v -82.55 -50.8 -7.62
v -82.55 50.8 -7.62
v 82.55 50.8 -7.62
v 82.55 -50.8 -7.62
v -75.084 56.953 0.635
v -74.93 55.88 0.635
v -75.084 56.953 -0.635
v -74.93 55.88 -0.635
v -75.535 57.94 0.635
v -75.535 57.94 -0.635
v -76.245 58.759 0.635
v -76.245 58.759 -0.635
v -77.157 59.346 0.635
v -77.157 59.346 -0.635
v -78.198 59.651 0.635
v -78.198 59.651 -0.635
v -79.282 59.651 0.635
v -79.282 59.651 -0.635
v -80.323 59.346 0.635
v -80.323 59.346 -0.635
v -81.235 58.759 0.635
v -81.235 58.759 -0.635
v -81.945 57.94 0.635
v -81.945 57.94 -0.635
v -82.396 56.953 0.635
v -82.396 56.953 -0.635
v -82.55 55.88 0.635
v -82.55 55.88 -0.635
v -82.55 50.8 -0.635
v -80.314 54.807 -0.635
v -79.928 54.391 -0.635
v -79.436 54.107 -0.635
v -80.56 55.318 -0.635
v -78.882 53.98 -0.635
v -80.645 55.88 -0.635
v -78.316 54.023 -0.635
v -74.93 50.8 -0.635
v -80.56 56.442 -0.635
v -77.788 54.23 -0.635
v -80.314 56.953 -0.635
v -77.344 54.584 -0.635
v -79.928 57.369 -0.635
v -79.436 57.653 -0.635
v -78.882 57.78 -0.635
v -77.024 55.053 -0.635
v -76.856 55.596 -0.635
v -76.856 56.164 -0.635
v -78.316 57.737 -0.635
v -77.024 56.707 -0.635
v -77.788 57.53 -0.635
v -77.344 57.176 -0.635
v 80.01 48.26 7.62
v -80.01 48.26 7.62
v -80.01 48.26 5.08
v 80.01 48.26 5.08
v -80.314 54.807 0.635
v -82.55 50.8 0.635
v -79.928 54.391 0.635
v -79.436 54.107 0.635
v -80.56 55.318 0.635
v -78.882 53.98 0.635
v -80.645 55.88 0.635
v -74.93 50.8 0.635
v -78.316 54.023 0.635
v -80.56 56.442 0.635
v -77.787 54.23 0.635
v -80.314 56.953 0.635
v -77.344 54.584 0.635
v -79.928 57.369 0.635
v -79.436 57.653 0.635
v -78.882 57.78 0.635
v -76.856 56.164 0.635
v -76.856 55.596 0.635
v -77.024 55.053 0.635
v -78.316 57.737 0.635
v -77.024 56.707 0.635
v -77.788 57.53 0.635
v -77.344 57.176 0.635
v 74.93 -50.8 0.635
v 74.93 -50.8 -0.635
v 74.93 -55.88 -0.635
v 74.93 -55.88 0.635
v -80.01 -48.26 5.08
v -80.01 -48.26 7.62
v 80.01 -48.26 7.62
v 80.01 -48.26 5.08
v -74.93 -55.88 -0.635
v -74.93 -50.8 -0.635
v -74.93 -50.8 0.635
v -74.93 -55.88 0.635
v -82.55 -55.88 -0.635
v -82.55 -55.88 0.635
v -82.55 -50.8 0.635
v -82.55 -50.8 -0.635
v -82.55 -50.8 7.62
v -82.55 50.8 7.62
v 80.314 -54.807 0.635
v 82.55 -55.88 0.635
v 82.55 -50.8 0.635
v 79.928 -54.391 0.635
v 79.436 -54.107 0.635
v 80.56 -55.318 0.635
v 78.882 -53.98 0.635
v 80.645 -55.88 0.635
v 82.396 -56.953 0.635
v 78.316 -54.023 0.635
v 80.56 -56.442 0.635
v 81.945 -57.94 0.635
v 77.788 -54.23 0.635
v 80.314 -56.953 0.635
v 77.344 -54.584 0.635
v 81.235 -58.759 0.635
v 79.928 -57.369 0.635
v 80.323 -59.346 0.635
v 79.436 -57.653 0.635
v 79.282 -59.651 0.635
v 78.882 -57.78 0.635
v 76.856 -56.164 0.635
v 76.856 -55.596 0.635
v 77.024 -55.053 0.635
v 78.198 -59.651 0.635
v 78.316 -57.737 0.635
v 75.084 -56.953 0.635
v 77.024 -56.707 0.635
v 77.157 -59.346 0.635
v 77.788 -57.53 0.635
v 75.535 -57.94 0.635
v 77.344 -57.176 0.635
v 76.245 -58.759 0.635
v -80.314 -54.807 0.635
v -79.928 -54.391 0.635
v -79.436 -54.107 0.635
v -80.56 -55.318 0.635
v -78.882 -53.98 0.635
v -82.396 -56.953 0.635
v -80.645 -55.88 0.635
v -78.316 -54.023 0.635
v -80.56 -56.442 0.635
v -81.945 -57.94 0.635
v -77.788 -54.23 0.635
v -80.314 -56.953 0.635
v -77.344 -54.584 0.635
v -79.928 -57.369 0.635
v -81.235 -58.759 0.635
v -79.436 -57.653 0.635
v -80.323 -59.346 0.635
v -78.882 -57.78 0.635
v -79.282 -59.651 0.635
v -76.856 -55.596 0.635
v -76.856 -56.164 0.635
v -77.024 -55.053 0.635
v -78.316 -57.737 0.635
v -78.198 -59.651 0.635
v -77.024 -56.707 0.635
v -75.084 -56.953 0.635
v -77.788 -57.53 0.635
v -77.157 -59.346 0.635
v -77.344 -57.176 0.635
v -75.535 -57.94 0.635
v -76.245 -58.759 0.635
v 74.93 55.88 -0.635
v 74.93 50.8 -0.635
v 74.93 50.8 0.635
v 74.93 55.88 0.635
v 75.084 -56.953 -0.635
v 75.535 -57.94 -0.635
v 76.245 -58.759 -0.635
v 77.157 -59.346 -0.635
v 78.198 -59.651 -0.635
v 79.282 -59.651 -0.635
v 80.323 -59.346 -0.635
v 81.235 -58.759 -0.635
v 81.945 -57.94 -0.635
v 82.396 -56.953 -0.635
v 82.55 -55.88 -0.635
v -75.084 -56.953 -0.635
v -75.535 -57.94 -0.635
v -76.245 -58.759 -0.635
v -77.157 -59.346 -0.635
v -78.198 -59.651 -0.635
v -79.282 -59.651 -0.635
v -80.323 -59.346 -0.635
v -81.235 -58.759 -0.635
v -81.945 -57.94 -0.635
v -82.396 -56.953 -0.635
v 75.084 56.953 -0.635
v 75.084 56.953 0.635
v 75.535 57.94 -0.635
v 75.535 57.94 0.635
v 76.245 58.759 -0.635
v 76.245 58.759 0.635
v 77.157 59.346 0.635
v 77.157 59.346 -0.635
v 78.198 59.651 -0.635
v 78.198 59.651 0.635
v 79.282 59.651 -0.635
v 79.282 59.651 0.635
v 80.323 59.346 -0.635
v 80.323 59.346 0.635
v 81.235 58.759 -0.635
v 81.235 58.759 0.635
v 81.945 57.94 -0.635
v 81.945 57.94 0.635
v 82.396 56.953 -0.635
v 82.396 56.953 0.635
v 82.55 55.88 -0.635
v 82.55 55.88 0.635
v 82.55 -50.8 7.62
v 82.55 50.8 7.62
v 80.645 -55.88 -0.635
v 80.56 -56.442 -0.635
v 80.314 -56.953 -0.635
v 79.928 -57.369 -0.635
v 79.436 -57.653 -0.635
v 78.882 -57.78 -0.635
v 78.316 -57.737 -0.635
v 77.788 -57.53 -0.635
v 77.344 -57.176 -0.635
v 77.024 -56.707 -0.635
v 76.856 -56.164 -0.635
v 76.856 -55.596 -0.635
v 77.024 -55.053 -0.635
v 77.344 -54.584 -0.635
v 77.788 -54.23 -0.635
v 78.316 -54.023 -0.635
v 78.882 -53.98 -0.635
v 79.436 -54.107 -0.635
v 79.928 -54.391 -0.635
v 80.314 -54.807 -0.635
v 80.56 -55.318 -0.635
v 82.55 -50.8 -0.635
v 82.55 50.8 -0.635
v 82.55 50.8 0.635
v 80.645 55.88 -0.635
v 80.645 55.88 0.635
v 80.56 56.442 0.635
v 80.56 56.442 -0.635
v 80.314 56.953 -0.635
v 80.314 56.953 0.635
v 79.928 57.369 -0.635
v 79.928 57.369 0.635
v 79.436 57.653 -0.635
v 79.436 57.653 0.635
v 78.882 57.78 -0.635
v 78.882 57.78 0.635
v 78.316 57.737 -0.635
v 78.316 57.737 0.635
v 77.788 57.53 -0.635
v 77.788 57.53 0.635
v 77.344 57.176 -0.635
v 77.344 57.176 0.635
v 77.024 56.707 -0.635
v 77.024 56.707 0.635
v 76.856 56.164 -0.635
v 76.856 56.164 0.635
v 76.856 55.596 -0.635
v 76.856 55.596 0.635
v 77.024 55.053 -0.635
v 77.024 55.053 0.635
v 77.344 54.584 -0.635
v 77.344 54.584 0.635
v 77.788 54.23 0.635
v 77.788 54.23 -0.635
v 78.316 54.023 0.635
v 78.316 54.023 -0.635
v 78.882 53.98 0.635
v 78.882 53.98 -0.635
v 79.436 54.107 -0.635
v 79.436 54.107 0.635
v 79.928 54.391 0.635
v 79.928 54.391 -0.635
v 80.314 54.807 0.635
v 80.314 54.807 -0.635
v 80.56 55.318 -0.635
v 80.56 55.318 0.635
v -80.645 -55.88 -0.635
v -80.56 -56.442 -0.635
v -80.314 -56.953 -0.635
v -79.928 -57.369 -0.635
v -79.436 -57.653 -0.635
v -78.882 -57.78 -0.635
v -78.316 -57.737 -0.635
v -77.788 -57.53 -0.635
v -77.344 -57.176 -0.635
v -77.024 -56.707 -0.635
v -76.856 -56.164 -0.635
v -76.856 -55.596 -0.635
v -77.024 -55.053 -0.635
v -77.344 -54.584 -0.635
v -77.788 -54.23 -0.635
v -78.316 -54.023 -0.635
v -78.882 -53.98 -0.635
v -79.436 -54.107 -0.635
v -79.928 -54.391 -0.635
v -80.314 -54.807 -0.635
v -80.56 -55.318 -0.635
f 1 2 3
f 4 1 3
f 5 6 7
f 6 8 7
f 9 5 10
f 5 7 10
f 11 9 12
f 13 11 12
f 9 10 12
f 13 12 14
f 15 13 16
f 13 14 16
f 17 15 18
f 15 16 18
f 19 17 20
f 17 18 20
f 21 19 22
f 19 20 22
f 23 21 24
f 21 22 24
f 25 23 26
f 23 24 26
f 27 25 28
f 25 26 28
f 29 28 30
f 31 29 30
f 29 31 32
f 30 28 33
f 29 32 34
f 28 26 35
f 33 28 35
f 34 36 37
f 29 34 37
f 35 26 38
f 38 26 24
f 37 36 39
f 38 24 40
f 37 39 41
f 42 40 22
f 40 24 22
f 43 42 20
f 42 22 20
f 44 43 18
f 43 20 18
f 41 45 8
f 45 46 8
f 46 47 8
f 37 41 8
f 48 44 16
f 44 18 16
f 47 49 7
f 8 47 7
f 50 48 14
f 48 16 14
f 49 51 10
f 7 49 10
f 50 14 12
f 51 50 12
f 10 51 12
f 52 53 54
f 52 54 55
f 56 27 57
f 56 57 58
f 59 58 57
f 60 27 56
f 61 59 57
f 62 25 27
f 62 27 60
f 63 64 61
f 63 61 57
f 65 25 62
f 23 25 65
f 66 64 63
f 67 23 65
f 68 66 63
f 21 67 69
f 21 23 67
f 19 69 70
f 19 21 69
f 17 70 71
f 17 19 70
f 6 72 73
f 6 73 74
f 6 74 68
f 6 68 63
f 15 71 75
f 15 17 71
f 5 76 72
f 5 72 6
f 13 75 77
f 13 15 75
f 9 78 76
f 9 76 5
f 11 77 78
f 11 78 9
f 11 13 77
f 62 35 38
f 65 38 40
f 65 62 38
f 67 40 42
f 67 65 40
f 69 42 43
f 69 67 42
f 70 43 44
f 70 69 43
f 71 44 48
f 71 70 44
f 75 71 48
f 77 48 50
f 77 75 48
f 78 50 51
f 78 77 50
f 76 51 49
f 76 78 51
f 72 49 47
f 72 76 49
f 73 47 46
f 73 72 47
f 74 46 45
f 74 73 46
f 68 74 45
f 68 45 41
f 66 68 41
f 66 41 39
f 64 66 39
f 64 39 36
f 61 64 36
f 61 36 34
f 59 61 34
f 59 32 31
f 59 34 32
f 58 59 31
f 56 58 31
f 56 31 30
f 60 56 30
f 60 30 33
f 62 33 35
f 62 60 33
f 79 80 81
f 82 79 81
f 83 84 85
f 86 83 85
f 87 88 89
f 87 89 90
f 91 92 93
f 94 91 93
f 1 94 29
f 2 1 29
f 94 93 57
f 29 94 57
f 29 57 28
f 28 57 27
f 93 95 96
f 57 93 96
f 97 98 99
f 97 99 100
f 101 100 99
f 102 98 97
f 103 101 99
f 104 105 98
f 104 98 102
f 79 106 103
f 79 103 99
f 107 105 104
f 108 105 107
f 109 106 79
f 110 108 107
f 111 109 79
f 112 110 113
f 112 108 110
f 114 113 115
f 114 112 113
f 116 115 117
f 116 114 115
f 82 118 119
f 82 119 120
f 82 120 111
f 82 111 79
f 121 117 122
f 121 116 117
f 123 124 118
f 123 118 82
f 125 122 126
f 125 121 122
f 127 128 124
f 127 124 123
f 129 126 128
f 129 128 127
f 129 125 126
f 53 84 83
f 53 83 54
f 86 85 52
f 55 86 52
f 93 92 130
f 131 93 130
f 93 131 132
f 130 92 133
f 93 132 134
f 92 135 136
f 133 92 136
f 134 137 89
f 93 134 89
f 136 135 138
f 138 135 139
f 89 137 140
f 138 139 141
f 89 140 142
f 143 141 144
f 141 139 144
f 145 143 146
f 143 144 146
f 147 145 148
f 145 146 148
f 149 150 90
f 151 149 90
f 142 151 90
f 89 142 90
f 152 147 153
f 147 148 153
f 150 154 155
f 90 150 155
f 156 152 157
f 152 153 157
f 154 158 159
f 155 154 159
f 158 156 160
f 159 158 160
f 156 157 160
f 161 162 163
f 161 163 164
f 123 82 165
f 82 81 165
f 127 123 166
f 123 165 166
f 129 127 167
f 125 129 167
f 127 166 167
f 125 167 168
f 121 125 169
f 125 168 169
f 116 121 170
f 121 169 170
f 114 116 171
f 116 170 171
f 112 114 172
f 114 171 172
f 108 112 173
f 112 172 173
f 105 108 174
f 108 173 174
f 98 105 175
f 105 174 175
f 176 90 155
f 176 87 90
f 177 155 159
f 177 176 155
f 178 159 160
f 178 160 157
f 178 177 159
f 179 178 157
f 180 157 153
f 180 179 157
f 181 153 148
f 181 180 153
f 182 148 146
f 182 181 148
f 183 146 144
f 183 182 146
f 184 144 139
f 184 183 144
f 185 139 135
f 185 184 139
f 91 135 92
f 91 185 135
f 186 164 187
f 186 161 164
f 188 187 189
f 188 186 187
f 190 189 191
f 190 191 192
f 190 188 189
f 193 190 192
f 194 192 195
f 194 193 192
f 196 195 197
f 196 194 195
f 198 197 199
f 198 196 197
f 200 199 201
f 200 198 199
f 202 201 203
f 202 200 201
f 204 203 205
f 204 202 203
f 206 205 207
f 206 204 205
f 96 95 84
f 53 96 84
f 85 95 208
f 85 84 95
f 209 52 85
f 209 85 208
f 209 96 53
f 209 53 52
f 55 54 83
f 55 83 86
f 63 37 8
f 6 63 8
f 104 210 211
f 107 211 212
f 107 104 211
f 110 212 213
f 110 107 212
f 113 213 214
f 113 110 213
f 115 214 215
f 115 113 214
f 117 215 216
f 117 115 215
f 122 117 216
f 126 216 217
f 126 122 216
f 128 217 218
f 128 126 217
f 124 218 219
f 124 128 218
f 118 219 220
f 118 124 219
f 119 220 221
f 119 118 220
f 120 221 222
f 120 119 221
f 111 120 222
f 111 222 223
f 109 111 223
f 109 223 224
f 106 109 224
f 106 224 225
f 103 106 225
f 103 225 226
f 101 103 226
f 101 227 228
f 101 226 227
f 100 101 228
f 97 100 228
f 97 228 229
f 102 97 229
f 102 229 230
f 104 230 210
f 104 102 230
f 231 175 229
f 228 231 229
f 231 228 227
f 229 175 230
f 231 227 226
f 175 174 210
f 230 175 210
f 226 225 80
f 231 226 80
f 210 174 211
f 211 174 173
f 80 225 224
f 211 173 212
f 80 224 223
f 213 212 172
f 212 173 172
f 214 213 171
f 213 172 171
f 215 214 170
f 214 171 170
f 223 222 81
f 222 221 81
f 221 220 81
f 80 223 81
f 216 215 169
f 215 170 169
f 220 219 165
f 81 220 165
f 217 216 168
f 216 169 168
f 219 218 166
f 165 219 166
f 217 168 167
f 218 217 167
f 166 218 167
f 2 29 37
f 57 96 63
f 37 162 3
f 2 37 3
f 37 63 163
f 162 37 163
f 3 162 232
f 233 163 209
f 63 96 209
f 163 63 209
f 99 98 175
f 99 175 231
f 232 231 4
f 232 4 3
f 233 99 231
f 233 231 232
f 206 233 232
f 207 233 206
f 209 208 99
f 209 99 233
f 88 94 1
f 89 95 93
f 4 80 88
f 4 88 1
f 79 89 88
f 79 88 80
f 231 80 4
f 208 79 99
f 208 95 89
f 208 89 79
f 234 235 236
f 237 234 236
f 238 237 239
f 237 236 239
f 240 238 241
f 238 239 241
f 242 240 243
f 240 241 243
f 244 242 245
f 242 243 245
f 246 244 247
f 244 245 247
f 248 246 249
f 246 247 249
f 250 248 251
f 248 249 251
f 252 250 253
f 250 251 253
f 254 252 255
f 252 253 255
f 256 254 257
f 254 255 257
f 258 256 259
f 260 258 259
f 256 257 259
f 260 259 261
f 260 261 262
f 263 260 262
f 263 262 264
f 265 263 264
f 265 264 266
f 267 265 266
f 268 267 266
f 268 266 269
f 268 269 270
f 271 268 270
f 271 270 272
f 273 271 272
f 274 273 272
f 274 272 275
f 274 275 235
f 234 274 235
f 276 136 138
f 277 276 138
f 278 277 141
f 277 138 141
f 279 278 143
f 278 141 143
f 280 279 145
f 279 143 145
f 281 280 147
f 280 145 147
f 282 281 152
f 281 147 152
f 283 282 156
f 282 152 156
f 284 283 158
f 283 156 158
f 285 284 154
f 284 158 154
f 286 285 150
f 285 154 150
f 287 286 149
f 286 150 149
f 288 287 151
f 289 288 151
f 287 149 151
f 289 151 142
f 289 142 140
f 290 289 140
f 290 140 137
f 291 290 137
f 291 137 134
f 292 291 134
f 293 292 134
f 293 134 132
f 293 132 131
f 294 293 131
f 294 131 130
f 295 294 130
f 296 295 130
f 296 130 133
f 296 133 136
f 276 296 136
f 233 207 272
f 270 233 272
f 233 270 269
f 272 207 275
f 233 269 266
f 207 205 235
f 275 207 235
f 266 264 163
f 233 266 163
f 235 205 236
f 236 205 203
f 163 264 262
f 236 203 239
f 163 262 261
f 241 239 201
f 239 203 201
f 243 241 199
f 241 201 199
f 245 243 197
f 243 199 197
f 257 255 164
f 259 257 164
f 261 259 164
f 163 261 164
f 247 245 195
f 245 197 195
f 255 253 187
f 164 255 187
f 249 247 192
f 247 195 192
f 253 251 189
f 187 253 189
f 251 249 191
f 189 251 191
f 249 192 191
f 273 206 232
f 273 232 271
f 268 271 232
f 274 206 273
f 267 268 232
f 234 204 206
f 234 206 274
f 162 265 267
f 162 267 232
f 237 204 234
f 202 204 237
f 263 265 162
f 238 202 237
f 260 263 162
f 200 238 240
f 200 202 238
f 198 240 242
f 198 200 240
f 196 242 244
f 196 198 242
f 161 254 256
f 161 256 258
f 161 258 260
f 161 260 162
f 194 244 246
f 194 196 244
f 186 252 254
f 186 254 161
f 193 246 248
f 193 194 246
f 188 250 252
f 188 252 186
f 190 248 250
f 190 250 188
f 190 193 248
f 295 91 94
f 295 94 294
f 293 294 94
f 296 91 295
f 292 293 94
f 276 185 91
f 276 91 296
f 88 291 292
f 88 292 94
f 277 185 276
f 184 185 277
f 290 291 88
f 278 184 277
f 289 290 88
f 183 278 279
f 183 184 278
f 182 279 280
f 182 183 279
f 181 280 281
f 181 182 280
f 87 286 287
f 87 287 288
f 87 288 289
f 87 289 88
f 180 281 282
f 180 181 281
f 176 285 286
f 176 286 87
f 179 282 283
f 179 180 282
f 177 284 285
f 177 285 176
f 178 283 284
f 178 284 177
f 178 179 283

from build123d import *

# Parameters (mm, degrees)
SKETCH1_W               = 165.1
SKETCH1_H               = 101.6
BOSS_EXTRUDE1_DEPTH     = 7.62
SKETCH2_W               = 160.02
SKETCH2_H               = 96.52
CUT_EXTRUDE1_DEPTH      = 2.54
BOSS_EXTRUDE2_START     = -7.62
BOSS_EXTRUDE2_DEPTH     = 0.635
SKETCH4_R               = 1.905
CUT_EXTRUDE2_DEPTH      = 103.203442334
MIRROR2_START           = -7.62
MIRROR2_COPY_1_DEPTH    = 0.635
MIRROR2_COPY_2_SKETCH_R = 1.905
MIRROR2_COPY_2_DEPTH    = 103.203442334


with BuildPart() as part:
    # Sketch1 → Boss-Extrude1 (new, symmetric)
    with BuildSketch(Plane.XY):
        Rectangle(SKETCH1_W, SKETCH1_H)
    extrude(amount=BOSS_EXTRUDE1_DEPTH, both=True)

    # Sketch2 → Cut-Extrude1 (cut)
    with BuildSketch(Plane.XY.offset(7.62)):
        Rectangle(SKETCH2_W, SKETCH2_H)
    extrude(amount=-CUT_EXTRUDE1_DEPTH, mode=Mode.SUBTRACT)

    # Sketch3 → Boss-Extrude2 (add, symmetric)
    with BuildSketch(Plane(origin=(0, 0, -7.62), x_dir=(-1, 0, 0), z_dir=(0, 0, -1)).offset(BOSS_EXTRUDE2_START)):
        with BuildLine():
            Line((-82.55, 55.88), (-82.55, 50.8))
            Line((-82.55, 50.8), (-74.93, 50.8))
            Line((-74.93, 50.8), (-74.93, 55.88))
            ThreePointArc((-74.93, 55.88), (-78.74, 59.69), (-82.55, 55.88))
        make_face()
    boss_extrude2 = extrude(amount=BOSS_EXTRUDE2_DEPTH, both=True)

    # Sketch4 → Cut-Extrude2 (cut, through all)
    with BuildSketch(Plane.XY.offset(0.635)):
        with Locations((78.74, 55.88)):
            Circle(SKETCH4_R)
    cut_extrude2 = extrude(amount=-CUT_EXTRUDE2_DEPTH, mode=Mode.SUBTRACT)

    # Mirror1: Boss-Extrude2, Cut-Extrude2 across plane
    add(boss_extrude2.mirror(Plane.ZX))
    add(cut_extrude2.mirror(Plane.ZX), mode=Mode.SUBTRACT)

    # Mirror2: Boss-Extrude2, Cut-Extrude2 across plane
    add(boss_extrude2.mirror(Plane(origin=(0, 0, 0), x_dir=(0, 0, 1), z_dir=(1, 0, 0))))
    add(cut_extrude2.mirror(Plane(origin=(0, 0, 0), x_dir=(0, 0, 1), z_dir=(1, 0, 0))), mode=Mode.SUBTRACT)

    # Mirror2 copy 1 sketch → Mirror2 copy 1 (add, symmetric)
    with BuildSketch(Plane(origin=(0, 0, -7.62), x_dir=(1, 0, 0), z_dir=(0, 0, -1)).offset(MIRROR2_START)):
        with BuildLine():
            Line((-82.55, 55.88), (-82.55, 50.8))
            Line((-82.55, 50.8), (-74.93, 50.8))
            Line((-74.93, 50.8), (-74.93, 55.88))
            ThreePointArc((-74.93, 55.88), (-78.74, 59.69), (-82.55, 55.88))
        make_face()
    extrude(amount=MIRROR2_COPY_1_DEPTH, both=True)

    # Mirror2 copy 2 sketch → Mirror2 copy 2 (cut, through all)
    with BuildSketch(Plane(origin=(0, 0, 0.635), x_dir=(-1, 0, 0), z_dir=(0, 0, 1))):
        with Locations((78.74, 55.88)):
            Circle(MIRROR2_COPY_2_SKETCH_R)
    extrude(amount=-MIRROR2_COPY_2_DEPTH, mode=Mode.SUBTRACT)


solid = part.part
